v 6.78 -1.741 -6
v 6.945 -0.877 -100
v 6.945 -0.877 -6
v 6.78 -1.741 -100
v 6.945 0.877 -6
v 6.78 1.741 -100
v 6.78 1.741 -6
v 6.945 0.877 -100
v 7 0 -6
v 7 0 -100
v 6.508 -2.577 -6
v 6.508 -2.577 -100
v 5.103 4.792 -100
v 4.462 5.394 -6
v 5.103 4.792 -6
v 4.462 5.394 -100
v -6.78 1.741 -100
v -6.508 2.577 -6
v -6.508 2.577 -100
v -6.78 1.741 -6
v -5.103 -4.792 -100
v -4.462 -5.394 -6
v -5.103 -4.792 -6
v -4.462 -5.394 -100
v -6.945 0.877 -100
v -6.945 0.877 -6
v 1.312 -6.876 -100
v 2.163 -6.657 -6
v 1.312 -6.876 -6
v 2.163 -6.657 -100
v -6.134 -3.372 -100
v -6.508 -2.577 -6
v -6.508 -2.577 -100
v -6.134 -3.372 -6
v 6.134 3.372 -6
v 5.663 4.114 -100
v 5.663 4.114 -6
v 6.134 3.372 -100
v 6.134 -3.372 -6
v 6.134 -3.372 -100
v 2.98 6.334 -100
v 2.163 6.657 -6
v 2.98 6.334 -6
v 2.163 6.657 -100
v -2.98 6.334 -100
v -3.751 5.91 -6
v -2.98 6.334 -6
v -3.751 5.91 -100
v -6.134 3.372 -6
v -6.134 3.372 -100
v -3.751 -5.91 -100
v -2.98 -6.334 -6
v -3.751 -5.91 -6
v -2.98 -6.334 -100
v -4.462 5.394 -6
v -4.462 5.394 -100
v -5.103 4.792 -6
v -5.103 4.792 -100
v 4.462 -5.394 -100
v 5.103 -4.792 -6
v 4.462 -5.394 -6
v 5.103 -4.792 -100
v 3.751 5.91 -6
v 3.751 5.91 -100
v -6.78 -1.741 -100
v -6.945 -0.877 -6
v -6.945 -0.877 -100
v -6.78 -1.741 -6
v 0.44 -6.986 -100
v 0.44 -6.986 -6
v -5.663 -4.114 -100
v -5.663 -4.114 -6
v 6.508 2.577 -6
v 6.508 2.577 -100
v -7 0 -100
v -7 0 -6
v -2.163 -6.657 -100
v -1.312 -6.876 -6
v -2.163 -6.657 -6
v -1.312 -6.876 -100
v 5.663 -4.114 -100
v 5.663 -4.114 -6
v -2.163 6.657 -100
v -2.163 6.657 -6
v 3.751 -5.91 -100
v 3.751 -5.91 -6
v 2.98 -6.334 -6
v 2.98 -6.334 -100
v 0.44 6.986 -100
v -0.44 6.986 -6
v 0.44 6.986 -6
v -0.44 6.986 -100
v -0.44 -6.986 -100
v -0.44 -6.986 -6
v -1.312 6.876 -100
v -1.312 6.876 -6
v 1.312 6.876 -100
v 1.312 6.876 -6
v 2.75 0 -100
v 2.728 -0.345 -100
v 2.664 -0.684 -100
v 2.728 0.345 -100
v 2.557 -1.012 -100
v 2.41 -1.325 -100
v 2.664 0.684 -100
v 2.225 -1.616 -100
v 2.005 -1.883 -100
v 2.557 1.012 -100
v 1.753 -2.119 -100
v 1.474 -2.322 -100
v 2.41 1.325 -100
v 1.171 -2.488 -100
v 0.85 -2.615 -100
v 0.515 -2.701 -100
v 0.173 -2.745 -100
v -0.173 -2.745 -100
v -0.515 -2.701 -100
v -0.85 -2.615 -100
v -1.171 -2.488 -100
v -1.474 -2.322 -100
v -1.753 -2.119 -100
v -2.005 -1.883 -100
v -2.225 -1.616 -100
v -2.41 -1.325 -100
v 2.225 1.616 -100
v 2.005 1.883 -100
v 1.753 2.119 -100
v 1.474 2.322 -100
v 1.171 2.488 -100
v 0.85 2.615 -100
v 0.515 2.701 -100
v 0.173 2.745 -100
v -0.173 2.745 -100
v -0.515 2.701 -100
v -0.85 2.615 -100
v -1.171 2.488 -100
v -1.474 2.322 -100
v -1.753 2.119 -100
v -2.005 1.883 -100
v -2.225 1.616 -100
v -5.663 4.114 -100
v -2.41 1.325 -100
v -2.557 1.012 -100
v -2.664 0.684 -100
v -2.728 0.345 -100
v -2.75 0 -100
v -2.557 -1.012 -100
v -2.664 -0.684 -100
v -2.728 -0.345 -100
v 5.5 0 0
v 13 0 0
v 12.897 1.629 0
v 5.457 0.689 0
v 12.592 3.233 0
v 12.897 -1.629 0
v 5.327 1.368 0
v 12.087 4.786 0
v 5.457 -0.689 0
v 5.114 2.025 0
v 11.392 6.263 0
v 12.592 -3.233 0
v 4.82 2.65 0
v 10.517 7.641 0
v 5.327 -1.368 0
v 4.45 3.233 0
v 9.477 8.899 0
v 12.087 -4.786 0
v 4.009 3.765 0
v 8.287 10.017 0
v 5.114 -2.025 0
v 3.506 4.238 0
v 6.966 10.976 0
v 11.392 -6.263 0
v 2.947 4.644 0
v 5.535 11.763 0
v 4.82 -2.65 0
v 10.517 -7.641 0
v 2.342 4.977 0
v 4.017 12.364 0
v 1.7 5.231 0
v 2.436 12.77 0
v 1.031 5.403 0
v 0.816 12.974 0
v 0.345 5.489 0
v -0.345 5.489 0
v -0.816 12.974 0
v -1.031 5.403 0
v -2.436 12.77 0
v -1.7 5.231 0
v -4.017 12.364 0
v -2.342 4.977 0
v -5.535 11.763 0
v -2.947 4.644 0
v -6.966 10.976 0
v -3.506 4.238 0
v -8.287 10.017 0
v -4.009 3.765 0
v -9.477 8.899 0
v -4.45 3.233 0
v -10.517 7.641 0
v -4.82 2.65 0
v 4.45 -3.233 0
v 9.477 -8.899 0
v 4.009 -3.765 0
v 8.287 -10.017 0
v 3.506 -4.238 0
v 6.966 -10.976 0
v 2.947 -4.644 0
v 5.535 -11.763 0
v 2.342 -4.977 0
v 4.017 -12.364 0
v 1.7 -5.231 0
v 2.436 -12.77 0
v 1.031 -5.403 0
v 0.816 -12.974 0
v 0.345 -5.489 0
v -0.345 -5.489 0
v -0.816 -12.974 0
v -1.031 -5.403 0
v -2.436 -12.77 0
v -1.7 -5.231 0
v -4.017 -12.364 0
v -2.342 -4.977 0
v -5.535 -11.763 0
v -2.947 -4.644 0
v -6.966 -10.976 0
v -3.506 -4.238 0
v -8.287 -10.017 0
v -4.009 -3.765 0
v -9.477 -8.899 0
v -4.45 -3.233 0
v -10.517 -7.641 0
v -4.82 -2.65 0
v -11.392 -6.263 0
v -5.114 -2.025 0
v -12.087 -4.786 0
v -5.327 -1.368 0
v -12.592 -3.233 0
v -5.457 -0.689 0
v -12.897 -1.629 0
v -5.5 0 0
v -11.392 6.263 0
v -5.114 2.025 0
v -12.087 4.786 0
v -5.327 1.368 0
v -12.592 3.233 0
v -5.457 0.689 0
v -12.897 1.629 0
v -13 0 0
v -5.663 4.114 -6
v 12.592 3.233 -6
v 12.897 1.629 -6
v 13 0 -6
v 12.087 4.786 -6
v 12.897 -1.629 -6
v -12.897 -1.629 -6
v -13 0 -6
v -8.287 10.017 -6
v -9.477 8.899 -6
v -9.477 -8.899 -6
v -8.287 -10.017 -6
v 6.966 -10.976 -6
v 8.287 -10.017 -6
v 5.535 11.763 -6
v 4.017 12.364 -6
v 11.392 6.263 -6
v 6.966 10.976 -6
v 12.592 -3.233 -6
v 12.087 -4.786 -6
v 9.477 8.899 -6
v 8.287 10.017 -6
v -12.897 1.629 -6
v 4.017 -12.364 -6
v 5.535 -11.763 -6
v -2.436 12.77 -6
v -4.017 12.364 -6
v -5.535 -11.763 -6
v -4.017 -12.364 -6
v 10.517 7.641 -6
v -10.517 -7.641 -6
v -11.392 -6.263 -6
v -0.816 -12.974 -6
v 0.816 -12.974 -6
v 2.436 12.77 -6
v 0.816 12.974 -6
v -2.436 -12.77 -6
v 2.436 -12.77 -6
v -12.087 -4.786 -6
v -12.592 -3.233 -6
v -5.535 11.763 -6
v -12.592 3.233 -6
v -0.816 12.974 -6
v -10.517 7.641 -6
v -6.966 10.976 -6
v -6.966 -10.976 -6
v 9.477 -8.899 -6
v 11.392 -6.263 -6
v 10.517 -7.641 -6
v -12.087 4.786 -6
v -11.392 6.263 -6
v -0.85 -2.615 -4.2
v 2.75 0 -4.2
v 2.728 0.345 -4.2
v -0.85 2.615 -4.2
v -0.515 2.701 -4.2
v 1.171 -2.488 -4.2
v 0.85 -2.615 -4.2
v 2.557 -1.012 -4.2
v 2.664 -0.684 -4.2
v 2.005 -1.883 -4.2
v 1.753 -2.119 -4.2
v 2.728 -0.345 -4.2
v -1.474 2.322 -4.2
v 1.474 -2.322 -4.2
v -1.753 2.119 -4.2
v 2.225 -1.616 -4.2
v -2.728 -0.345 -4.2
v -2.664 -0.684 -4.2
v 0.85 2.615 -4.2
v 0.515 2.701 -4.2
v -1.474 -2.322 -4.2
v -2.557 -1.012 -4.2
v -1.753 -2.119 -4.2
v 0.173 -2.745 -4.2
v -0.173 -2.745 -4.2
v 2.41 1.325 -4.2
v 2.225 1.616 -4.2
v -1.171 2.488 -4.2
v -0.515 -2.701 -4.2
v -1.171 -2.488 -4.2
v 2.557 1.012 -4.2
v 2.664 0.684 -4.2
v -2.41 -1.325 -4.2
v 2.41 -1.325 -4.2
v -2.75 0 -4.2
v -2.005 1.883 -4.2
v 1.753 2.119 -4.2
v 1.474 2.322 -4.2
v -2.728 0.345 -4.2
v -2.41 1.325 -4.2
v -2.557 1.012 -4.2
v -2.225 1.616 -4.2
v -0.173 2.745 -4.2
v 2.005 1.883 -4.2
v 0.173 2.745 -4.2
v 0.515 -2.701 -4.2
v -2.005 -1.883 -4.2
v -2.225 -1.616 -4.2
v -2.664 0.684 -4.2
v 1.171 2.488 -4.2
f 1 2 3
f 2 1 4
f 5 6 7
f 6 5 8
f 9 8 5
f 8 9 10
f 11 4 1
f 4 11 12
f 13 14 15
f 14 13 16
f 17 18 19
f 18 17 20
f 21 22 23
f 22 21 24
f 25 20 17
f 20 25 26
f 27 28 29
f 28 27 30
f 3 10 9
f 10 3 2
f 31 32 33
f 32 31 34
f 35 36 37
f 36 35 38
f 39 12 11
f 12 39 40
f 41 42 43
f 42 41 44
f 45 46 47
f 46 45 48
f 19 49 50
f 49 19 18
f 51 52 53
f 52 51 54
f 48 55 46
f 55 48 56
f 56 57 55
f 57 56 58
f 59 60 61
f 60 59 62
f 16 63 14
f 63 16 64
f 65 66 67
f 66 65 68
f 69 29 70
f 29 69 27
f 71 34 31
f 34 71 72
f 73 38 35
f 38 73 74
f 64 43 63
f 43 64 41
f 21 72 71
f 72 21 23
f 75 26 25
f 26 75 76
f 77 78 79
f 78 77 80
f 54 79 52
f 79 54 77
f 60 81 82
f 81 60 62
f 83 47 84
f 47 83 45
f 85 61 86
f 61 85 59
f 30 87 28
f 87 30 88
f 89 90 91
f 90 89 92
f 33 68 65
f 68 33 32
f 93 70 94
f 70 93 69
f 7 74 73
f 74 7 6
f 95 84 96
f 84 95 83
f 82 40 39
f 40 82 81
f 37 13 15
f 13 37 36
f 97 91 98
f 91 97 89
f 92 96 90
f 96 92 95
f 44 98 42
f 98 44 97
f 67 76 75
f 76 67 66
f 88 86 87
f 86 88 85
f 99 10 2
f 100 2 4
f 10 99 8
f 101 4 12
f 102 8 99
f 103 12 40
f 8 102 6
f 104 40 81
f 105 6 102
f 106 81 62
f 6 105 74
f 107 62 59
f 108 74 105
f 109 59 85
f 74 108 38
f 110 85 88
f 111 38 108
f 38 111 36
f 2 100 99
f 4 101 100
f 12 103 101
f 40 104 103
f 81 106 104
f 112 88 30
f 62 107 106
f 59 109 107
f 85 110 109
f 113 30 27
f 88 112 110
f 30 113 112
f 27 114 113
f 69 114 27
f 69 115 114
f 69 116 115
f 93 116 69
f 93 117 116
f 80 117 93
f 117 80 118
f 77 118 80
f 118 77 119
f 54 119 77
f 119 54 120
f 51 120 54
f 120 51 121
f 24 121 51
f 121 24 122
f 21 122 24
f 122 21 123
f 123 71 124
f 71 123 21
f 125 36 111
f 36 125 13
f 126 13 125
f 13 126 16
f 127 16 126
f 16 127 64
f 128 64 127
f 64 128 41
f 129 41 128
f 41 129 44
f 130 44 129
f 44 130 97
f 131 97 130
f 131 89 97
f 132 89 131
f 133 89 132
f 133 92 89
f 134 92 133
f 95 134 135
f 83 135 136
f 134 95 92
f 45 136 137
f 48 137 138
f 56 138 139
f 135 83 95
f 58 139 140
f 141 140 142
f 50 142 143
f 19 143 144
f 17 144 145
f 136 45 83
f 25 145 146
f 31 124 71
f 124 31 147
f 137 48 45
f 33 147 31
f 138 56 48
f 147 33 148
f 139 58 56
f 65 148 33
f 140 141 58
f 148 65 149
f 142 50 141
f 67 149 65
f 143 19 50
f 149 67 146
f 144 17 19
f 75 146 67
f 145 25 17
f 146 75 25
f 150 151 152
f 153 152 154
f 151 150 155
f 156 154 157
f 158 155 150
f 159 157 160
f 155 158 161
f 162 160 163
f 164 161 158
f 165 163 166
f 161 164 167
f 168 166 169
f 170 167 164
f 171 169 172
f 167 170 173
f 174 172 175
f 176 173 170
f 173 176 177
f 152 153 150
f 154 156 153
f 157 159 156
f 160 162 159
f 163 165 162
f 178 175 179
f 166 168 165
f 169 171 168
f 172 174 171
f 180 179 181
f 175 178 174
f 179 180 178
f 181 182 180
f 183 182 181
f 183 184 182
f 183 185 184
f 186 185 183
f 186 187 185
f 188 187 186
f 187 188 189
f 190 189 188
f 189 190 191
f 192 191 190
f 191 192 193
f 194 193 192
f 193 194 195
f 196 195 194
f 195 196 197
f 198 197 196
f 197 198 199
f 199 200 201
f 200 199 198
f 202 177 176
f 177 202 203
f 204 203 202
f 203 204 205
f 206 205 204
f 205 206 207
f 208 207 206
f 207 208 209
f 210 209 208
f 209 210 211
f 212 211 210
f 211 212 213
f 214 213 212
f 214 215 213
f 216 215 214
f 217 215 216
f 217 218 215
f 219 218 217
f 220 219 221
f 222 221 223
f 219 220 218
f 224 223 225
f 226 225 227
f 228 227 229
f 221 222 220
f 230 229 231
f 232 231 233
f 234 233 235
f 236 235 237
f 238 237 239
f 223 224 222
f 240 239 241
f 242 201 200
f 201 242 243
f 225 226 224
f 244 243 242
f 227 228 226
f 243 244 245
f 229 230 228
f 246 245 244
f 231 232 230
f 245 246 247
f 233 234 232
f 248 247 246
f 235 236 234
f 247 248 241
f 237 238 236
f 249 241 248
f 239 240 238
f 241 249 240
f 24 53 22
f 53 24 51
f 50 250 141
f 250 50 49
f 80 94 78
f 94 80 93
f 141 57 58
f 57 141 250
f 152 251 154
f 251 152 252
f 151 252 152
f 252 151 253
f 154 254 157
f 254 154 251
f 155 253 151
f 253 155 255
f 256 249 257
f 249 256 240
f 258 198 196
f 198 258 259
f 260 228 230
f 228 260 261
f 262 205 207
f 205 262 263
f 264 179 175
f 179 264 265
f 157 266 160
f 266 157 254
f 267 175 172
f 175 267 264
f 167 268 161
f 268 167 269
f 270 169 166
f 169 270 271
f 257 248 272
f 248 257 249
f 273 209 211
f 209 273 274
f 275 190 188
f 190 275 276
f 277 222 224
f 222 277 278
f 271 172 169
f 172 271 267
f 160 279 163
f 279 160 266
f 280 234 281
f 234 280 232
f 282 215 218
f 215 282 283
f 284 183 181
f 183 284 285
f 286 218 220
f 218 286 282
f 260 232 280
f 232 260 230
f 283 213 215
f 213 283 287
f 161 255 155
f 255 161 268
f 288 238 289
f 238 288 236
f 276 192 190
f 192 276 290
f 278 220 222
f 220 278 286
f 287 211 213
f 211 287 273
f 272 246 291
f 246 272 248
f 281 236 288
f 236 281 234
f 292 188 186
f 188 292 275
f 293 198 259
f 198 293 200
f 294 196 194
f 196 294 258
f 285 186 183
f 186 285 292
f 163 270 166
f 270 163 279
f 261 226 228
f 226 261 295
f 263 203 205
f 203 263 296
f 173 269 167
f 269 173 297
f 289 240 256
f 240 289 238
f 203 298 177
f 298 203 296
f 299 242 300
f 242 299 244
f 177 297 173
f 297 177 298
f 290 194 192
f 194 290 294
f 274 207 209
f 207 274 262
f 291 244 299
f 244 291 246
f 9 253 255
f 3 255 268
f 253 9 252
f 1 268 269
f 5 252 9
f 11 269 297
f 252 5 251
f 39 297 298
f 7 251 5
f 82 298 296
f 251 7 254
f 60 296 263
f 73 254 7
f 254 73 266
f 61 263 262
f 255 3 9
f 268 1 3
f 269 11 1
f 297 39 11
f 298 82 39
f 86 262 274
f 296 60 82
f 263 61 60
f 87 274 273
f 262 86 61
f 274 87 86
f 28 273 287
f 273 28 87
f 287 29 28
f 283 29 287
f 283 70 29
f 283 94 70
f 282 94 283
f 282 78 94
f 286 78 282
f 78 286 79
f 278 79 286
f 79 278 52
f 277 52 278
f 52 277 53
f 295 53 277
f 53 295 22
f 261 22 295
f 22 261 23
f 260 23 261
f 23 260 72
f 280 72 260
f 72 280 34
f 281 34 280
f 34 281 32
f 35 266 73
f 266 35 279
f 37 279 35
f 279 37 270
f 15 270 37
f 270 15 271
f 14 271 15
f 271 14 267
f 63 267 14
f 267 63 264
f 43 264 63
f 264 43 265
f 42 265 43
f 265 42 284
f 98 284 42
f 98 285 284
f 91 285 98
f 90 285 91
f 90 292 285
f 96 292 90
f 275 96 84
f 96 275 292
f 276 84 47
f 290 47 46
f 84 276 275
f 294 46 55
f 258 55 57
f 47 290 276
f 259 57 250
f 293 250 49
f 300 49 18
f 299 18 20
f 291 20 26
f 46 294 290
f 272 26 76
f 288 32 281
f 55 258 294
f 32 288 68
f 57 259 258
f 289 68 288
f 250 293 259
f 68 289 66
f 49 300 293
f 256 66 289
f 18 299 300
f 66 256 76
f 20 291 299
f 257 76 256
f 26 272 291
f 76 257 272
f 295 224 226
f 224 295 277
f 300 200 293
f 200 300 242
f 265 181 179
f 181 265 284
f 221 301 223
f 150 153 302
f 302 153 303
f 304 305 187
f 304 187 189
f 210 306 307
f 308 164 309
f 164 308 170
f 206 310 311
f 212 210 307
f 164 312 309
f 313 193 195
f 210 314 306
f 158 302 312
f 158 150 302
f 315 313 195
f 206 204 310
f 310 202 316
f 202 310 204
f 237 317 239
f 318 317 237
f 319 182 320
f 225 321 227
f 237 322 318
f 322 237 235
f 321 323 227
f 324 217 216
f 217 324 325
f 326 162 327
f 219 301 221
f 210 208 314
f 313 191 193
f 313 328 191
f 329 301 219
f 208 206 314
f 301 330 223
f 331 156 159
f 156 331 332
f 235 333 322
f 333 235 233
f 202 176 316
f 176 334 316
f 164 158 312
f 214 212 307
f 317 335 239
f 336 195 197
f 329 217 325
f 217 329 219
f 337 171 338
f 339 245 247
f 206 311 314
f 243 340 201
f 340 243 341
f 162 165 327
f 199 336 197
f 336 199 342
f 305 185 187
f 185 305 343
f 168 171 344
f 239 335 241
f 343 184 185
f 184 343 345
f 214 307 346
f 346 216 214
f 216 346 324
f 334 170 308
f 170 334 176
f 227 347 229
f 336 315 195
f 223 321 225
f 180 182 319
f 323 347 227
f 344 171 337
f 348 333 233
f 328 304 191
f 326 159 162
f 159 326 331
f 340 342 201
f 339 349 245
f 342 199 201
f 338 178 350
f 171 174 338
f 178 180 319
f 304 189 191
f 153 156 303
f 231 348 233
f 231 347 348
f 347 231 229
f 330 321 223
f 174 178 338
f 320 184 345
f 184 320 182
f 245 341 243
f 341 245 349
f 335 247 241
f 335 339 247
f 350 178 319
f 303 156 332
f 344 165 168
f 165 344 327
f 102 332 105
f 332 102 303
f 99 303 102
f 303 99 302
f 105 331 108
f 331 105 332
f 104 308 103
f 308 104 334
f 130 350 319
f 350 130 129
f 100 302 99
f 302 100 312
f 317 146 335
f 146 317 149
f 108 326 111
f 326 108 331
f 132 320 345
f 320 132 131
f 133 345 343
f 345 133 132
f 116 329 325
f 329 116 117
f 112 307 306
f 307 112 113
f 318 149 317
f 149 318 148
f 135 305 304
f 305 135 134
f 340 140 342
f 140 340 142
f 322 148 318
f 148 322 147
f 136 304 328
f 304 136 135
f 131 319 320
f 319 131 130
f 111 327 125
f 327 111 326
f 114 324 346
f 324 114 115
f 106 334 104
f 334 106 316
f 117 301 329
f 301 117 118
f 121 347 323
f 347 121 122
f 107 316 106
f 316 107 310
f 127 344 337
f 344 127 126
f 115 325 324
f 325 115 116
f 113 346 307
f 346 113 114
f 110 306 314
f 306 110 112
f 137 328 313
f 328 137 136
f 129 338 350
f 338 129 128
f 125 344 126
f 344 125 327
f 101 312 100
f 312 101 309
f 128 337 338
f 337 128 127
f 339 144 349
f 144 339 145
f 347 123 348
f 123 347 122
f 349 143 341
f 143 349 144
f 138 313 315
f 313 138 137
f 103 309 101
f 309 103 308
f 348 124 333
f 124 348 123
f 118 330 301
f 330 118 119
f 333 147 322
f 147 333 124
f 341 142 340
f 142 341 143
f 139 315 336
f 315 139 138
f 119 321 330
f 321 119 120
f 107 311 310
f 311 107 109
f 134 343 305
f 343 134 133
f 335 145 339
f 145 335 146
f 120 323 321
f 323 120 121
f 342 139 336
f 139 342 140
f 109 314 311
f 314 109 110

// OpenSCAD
$fn = 50;


difference() {
	union() {
		translate(v = [0, 0, -100.0000000000]) {
			cylinder(h = 100, r = 7.0000000000);
		}
		translate(v = [0, 0, -6.0000000000]) {
			cylinder(h = 6, r = 13.0000000000);
		}
	}
	union() {
		translate(v = [0, 0, 0]) {
			rotate(a = [0, 0, 0]) {
				difference() {
					union() {
						#translate(v = [0, 0, -100.0000000000]) {
							cylinder(h = 100, r = 2.2500000000);
						}
						#translate(v = [0, 0, -4.2000000000]) {
							cylinder(h = 4.2000000000, r = 7.0000000000, r1 = 2.7500000000, r2 = 5.5000000000);
						}
						#translate(v = [0, 0, -100.0000000000]) {
							cylinder(h = 100, r = 2.7500000000);
						}
						#translate(v = [0, 0, -100.0000000000]) {
							cylinder(h = 100, r = 2.2500000000);
						}
					}
					union();
				}
			}
		}
	}
}
